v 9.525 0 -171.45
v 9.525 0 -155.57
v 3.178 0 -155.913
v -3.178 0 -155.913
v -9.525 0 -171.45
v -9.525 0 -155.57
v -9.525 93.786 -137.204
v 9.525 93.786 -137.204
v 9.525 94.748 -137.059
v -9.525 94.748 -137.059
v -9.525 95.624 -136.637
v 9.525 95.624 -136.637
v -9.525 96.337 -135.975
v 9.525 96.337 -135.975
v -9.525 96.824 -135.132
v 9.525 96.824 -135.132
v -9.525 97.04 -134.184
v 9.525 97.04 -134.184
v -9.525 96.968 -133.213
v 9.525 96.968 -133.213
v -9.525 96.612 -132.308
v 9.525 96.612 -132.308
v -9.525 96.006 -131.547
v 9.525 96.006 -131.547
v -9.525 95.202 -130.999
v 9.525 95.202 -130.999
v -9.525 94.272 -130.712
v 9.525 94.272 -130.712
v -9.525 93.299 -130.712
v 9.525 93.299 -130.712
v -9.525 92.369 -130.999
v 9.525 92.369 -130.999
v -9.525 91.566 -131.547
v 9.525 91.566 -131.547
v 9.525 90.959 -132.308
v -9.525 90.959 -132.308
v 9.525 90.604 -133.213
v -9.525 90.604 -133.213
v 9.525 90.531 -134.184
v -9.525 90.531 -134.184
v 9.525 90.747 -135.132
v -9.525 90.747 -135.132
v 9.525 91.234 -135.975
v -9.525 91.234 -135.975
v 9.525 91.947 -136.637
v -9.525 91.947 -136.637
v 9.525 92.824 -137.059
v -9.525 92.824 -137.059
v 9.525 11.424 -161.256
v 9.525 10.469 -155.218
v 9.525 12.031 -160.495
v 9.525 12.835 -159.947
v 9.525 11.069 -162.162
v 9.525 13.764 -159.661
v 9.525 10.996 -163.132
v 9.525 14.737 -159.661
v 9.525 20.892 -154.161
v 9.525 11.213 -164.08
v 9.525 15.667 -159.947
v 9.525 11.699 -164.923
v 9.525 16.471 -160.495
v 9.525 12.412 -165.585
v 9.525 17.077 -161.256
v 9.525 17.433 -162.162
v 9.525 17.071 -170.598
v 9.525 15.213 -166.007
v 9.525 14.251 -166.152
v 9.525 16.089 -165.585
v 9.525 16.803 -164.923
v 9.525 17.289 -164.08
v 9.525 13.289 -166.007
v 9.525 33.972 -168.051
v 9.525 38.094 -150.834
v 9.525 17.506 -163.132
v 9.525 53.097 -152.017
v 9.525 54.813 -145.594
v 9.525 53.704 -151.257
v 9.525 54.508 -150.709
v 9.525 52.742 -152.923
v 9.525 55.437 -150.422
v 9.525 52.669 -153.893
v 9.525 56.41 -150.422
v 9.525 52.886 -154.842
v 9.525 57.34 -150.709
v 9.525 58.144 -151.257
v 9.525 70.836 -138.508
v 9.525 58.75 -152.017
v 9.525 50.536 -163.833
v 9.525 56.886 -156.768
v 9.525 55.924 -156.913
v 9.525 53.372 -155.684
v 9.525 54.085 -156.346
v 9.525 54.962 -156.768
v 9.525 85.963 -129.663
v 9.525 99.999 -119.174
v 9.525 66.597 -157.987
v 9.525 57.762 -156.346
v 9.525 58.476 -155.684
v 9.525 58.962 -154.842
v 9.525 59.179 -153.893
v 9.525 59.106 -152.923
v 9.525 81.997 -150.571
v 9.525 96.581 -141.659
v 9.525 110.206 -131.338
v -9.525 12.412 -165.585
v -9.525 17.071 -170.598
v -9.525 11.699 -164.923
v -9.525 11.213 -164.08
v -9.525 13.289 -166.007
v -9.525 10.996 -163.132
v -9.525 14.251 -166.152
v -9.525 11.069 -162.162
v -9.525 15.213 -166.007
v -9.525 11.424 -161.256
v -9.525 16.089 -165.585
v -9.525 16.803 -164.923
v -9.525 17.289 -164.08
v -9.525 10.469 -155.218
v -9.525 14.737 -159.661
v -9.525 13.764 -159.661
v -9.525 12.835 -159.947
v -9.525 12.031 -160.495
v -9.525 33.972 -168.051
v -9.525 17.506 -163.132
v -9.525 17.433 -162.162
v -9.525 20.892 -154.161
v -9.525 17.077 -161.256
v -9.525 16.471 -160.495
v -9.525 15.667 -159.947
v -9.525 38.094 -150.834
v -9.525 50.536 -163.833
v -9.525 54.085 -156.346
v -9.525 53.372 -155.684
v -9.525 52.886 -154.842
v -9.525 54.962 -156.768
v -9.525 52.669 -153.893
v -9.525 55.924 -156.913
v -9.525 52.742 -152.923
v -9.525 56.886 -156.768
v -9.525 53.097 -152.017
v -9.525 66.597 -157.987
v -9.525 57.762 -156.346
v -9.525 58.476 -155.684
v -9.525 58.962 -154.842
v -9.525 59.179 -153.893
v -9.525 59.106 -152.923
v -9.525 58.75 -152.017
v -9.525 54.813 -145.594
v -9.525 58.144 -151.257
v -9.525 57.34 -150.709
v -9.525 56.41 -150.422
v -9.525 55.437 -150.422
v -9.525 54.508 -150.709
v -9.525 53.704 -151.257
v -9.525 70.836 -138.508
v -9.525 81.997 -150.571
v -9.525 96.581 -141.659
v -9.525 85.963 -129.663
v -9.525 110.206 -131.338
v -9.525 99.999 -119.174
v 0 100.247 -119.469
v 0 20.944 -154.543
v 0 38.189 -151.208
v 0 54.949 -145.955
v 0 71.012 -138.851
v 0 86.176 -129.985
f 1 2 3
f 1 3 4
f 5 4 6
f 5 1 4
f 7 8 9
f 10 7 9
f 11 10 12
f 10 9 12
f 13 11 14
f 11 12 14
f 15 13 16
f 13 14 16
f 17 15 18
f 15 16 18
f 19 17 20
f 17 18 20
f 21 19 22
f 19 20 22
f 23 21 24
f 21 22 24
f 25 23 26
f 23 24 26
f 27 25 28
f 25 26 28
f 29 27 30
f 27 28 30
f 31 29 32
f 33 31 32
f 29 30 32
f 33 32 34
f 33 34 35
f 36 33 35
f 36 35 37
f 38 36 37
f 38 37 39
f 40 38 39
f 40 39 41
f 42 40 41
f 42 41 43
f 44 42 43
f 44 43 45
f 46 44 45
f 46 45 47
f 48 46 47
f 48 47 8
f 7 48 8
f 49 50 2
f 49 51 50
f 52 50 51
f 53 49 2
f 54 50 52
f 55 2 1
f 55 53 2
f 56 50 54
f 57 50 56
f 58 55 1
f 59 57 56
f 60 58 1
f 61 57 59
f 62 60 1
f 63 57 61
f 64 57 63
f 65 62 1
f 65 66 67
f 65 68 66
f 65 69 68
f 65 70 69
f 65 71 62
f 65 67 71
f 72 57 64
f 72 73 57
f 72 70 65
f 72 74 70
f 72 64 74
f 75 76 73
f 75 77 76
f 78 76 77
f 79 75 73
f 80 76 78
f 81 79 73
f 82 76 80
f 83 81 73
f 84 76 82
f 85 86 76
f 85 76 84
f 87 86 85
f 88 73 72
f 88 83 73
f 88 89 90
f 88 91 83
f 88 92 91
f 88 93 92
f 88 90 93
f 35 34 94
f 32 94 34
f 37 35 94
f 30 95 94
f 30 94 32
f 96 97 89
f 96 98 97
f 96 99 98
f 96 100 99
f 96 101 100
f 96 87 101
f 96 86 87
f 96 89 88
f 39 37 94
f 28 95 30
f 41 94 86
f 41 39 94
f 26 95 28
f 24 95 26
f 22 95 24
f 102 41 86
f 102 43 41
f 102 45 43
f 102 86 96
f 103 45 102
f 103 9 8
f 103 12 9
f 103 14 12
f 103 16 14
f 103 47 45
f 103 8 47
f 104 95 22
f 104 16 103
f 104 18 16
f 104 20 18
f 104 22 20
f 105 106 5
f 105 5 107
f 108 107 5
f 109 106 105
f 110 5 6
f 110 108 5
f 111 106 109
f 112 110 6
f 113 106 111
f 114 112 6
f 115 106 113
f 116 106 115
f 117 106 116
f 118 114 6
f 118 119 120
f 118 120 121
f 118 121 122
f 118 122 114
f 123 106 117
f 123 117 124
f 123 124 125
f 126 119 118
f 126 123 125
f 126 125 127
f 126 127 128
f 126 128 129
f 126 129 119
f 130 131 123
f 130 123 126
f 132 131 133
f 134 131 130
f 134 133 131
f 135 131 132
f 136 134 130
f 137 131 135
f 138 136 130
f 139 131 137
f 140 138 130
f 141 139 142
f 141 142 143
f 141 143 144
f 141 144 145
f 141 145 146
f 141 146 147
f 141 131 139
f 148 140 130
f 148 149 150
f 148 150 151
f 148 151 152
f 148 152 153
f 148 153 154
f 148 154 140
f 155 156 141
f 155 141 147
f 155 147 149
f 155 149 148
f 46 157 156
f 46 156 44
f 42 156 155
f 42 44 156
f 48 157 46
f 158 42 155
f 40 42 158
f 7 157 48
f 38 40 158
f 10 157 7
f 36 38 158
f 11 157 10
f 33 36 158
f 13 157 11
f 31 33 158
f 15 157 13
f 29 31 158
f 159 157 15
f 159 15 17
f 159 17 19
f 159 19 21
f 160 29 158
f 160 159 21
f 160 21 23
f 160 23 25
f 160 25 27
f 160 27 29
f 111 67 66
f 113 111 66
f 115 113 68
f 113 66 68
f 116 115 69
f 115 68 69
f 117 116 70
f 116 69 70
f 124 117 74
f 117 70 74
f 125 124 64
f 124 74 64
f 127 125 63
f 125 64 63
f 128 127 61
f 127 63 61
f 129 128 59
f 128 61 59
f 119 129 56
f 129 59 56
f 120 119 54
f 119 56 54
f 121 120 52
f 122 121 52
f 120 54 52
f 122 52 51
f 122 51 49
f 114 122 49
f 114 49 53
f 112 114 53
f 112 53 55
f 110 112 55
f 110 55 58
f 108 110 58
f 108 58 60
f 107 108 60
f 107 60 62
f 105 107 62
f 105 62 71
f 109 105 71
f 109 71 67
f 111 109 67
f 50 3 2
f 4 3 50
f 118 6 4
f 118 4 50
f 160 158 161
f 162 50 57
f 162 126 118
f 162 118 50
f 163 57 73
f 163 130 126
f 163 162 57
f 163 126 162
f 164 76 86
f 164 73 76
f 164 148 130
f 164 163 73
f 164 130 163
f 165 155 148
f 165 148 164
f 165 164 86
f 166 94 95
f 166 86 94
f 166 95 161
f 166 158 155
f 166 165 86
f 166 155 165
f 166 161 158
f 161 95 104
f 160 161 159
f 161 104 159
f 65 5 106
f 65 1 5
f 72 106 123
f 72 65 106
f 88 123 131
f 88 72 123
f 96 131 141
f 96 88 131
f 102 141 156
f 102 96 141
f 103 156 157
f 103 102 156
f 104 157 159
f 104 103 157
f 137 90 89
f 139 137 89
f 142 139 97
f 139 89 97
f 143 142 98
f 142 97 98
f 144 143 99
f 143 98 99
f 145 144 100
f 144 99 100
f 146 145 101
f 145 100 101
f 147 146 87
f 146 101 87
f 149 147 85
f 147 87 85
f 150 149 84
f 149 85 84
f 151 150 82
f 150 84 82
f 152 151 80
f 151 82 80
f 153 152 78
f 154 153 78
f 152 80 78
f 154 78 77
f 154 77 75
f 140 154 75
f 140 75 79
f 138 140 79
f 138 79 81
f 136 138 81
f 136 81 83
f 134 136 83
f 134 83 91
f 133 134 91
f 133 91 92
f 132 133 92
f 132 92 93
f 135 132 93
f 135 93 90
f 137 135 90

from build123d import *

# Parameters (mm, degrees)
REVOLVE1_ANGLE     = 40
SKETCH3_R          = 3.2639
CUT_EXTRUDE1_DEPTH = 205.703085759


with BuildPart() as part:
    # Sketch1 → Revolve1 (revolve)
    with BuildSketch(Plane(origin=(0, 0, 0), x_dir=(1, 0, 0), z_dir=(0, 1, 0))):
        Polygon((0, 152.4), (-9.525, 152.4), (-9.525, 171.45), (9.525, 171.45), (9.525, 152.4), align=None)
    revolve(axis=Axis((0, 0, 0), (1, 0, 0)), revolution_arc=REVOLVE1_ANGLE)

    # Sketch2 → Cut-Revolve1 (revolve, cut)
    with BuildSketch(Plane(origin=(0, 0, 0), x_dir=(1, 0, 0), z_dir=(0, 1, 0))):
        with BuildLine():
            Line((-117.856, 38.1), (117.856, 38.1))
            ThreePointArc((117.856, 38.1), (0, 155.956), (-117.856, 38.1))
        make_face()
    revolve(axis=Axis((0, 0, 0), (1, 0, 0)), mode=Mode.SUBTRACT)

    # Sketch3 → Cut-Extrude1 (cut, through all)
    with BuildSketch(Plane(origin=(9.525, 0, 0), x_dir=(0, 0, -1), z_dir=(1, 0, 0))):
        with Locations((162.888028743, 14.250855939)):
            Circle(SKETCH3_R)
        with Locations((153.64936083, 55.923793856)):
            Circle(SKETCH3_R)
        with Locations((133.939742895, 93.785617641)):
            Circle(SKETCH3_R)
    extrude(amount=-CUT_EXTRUDE1_DEPTH, mode=Mode.SUBTRACT)


solid = part.part
